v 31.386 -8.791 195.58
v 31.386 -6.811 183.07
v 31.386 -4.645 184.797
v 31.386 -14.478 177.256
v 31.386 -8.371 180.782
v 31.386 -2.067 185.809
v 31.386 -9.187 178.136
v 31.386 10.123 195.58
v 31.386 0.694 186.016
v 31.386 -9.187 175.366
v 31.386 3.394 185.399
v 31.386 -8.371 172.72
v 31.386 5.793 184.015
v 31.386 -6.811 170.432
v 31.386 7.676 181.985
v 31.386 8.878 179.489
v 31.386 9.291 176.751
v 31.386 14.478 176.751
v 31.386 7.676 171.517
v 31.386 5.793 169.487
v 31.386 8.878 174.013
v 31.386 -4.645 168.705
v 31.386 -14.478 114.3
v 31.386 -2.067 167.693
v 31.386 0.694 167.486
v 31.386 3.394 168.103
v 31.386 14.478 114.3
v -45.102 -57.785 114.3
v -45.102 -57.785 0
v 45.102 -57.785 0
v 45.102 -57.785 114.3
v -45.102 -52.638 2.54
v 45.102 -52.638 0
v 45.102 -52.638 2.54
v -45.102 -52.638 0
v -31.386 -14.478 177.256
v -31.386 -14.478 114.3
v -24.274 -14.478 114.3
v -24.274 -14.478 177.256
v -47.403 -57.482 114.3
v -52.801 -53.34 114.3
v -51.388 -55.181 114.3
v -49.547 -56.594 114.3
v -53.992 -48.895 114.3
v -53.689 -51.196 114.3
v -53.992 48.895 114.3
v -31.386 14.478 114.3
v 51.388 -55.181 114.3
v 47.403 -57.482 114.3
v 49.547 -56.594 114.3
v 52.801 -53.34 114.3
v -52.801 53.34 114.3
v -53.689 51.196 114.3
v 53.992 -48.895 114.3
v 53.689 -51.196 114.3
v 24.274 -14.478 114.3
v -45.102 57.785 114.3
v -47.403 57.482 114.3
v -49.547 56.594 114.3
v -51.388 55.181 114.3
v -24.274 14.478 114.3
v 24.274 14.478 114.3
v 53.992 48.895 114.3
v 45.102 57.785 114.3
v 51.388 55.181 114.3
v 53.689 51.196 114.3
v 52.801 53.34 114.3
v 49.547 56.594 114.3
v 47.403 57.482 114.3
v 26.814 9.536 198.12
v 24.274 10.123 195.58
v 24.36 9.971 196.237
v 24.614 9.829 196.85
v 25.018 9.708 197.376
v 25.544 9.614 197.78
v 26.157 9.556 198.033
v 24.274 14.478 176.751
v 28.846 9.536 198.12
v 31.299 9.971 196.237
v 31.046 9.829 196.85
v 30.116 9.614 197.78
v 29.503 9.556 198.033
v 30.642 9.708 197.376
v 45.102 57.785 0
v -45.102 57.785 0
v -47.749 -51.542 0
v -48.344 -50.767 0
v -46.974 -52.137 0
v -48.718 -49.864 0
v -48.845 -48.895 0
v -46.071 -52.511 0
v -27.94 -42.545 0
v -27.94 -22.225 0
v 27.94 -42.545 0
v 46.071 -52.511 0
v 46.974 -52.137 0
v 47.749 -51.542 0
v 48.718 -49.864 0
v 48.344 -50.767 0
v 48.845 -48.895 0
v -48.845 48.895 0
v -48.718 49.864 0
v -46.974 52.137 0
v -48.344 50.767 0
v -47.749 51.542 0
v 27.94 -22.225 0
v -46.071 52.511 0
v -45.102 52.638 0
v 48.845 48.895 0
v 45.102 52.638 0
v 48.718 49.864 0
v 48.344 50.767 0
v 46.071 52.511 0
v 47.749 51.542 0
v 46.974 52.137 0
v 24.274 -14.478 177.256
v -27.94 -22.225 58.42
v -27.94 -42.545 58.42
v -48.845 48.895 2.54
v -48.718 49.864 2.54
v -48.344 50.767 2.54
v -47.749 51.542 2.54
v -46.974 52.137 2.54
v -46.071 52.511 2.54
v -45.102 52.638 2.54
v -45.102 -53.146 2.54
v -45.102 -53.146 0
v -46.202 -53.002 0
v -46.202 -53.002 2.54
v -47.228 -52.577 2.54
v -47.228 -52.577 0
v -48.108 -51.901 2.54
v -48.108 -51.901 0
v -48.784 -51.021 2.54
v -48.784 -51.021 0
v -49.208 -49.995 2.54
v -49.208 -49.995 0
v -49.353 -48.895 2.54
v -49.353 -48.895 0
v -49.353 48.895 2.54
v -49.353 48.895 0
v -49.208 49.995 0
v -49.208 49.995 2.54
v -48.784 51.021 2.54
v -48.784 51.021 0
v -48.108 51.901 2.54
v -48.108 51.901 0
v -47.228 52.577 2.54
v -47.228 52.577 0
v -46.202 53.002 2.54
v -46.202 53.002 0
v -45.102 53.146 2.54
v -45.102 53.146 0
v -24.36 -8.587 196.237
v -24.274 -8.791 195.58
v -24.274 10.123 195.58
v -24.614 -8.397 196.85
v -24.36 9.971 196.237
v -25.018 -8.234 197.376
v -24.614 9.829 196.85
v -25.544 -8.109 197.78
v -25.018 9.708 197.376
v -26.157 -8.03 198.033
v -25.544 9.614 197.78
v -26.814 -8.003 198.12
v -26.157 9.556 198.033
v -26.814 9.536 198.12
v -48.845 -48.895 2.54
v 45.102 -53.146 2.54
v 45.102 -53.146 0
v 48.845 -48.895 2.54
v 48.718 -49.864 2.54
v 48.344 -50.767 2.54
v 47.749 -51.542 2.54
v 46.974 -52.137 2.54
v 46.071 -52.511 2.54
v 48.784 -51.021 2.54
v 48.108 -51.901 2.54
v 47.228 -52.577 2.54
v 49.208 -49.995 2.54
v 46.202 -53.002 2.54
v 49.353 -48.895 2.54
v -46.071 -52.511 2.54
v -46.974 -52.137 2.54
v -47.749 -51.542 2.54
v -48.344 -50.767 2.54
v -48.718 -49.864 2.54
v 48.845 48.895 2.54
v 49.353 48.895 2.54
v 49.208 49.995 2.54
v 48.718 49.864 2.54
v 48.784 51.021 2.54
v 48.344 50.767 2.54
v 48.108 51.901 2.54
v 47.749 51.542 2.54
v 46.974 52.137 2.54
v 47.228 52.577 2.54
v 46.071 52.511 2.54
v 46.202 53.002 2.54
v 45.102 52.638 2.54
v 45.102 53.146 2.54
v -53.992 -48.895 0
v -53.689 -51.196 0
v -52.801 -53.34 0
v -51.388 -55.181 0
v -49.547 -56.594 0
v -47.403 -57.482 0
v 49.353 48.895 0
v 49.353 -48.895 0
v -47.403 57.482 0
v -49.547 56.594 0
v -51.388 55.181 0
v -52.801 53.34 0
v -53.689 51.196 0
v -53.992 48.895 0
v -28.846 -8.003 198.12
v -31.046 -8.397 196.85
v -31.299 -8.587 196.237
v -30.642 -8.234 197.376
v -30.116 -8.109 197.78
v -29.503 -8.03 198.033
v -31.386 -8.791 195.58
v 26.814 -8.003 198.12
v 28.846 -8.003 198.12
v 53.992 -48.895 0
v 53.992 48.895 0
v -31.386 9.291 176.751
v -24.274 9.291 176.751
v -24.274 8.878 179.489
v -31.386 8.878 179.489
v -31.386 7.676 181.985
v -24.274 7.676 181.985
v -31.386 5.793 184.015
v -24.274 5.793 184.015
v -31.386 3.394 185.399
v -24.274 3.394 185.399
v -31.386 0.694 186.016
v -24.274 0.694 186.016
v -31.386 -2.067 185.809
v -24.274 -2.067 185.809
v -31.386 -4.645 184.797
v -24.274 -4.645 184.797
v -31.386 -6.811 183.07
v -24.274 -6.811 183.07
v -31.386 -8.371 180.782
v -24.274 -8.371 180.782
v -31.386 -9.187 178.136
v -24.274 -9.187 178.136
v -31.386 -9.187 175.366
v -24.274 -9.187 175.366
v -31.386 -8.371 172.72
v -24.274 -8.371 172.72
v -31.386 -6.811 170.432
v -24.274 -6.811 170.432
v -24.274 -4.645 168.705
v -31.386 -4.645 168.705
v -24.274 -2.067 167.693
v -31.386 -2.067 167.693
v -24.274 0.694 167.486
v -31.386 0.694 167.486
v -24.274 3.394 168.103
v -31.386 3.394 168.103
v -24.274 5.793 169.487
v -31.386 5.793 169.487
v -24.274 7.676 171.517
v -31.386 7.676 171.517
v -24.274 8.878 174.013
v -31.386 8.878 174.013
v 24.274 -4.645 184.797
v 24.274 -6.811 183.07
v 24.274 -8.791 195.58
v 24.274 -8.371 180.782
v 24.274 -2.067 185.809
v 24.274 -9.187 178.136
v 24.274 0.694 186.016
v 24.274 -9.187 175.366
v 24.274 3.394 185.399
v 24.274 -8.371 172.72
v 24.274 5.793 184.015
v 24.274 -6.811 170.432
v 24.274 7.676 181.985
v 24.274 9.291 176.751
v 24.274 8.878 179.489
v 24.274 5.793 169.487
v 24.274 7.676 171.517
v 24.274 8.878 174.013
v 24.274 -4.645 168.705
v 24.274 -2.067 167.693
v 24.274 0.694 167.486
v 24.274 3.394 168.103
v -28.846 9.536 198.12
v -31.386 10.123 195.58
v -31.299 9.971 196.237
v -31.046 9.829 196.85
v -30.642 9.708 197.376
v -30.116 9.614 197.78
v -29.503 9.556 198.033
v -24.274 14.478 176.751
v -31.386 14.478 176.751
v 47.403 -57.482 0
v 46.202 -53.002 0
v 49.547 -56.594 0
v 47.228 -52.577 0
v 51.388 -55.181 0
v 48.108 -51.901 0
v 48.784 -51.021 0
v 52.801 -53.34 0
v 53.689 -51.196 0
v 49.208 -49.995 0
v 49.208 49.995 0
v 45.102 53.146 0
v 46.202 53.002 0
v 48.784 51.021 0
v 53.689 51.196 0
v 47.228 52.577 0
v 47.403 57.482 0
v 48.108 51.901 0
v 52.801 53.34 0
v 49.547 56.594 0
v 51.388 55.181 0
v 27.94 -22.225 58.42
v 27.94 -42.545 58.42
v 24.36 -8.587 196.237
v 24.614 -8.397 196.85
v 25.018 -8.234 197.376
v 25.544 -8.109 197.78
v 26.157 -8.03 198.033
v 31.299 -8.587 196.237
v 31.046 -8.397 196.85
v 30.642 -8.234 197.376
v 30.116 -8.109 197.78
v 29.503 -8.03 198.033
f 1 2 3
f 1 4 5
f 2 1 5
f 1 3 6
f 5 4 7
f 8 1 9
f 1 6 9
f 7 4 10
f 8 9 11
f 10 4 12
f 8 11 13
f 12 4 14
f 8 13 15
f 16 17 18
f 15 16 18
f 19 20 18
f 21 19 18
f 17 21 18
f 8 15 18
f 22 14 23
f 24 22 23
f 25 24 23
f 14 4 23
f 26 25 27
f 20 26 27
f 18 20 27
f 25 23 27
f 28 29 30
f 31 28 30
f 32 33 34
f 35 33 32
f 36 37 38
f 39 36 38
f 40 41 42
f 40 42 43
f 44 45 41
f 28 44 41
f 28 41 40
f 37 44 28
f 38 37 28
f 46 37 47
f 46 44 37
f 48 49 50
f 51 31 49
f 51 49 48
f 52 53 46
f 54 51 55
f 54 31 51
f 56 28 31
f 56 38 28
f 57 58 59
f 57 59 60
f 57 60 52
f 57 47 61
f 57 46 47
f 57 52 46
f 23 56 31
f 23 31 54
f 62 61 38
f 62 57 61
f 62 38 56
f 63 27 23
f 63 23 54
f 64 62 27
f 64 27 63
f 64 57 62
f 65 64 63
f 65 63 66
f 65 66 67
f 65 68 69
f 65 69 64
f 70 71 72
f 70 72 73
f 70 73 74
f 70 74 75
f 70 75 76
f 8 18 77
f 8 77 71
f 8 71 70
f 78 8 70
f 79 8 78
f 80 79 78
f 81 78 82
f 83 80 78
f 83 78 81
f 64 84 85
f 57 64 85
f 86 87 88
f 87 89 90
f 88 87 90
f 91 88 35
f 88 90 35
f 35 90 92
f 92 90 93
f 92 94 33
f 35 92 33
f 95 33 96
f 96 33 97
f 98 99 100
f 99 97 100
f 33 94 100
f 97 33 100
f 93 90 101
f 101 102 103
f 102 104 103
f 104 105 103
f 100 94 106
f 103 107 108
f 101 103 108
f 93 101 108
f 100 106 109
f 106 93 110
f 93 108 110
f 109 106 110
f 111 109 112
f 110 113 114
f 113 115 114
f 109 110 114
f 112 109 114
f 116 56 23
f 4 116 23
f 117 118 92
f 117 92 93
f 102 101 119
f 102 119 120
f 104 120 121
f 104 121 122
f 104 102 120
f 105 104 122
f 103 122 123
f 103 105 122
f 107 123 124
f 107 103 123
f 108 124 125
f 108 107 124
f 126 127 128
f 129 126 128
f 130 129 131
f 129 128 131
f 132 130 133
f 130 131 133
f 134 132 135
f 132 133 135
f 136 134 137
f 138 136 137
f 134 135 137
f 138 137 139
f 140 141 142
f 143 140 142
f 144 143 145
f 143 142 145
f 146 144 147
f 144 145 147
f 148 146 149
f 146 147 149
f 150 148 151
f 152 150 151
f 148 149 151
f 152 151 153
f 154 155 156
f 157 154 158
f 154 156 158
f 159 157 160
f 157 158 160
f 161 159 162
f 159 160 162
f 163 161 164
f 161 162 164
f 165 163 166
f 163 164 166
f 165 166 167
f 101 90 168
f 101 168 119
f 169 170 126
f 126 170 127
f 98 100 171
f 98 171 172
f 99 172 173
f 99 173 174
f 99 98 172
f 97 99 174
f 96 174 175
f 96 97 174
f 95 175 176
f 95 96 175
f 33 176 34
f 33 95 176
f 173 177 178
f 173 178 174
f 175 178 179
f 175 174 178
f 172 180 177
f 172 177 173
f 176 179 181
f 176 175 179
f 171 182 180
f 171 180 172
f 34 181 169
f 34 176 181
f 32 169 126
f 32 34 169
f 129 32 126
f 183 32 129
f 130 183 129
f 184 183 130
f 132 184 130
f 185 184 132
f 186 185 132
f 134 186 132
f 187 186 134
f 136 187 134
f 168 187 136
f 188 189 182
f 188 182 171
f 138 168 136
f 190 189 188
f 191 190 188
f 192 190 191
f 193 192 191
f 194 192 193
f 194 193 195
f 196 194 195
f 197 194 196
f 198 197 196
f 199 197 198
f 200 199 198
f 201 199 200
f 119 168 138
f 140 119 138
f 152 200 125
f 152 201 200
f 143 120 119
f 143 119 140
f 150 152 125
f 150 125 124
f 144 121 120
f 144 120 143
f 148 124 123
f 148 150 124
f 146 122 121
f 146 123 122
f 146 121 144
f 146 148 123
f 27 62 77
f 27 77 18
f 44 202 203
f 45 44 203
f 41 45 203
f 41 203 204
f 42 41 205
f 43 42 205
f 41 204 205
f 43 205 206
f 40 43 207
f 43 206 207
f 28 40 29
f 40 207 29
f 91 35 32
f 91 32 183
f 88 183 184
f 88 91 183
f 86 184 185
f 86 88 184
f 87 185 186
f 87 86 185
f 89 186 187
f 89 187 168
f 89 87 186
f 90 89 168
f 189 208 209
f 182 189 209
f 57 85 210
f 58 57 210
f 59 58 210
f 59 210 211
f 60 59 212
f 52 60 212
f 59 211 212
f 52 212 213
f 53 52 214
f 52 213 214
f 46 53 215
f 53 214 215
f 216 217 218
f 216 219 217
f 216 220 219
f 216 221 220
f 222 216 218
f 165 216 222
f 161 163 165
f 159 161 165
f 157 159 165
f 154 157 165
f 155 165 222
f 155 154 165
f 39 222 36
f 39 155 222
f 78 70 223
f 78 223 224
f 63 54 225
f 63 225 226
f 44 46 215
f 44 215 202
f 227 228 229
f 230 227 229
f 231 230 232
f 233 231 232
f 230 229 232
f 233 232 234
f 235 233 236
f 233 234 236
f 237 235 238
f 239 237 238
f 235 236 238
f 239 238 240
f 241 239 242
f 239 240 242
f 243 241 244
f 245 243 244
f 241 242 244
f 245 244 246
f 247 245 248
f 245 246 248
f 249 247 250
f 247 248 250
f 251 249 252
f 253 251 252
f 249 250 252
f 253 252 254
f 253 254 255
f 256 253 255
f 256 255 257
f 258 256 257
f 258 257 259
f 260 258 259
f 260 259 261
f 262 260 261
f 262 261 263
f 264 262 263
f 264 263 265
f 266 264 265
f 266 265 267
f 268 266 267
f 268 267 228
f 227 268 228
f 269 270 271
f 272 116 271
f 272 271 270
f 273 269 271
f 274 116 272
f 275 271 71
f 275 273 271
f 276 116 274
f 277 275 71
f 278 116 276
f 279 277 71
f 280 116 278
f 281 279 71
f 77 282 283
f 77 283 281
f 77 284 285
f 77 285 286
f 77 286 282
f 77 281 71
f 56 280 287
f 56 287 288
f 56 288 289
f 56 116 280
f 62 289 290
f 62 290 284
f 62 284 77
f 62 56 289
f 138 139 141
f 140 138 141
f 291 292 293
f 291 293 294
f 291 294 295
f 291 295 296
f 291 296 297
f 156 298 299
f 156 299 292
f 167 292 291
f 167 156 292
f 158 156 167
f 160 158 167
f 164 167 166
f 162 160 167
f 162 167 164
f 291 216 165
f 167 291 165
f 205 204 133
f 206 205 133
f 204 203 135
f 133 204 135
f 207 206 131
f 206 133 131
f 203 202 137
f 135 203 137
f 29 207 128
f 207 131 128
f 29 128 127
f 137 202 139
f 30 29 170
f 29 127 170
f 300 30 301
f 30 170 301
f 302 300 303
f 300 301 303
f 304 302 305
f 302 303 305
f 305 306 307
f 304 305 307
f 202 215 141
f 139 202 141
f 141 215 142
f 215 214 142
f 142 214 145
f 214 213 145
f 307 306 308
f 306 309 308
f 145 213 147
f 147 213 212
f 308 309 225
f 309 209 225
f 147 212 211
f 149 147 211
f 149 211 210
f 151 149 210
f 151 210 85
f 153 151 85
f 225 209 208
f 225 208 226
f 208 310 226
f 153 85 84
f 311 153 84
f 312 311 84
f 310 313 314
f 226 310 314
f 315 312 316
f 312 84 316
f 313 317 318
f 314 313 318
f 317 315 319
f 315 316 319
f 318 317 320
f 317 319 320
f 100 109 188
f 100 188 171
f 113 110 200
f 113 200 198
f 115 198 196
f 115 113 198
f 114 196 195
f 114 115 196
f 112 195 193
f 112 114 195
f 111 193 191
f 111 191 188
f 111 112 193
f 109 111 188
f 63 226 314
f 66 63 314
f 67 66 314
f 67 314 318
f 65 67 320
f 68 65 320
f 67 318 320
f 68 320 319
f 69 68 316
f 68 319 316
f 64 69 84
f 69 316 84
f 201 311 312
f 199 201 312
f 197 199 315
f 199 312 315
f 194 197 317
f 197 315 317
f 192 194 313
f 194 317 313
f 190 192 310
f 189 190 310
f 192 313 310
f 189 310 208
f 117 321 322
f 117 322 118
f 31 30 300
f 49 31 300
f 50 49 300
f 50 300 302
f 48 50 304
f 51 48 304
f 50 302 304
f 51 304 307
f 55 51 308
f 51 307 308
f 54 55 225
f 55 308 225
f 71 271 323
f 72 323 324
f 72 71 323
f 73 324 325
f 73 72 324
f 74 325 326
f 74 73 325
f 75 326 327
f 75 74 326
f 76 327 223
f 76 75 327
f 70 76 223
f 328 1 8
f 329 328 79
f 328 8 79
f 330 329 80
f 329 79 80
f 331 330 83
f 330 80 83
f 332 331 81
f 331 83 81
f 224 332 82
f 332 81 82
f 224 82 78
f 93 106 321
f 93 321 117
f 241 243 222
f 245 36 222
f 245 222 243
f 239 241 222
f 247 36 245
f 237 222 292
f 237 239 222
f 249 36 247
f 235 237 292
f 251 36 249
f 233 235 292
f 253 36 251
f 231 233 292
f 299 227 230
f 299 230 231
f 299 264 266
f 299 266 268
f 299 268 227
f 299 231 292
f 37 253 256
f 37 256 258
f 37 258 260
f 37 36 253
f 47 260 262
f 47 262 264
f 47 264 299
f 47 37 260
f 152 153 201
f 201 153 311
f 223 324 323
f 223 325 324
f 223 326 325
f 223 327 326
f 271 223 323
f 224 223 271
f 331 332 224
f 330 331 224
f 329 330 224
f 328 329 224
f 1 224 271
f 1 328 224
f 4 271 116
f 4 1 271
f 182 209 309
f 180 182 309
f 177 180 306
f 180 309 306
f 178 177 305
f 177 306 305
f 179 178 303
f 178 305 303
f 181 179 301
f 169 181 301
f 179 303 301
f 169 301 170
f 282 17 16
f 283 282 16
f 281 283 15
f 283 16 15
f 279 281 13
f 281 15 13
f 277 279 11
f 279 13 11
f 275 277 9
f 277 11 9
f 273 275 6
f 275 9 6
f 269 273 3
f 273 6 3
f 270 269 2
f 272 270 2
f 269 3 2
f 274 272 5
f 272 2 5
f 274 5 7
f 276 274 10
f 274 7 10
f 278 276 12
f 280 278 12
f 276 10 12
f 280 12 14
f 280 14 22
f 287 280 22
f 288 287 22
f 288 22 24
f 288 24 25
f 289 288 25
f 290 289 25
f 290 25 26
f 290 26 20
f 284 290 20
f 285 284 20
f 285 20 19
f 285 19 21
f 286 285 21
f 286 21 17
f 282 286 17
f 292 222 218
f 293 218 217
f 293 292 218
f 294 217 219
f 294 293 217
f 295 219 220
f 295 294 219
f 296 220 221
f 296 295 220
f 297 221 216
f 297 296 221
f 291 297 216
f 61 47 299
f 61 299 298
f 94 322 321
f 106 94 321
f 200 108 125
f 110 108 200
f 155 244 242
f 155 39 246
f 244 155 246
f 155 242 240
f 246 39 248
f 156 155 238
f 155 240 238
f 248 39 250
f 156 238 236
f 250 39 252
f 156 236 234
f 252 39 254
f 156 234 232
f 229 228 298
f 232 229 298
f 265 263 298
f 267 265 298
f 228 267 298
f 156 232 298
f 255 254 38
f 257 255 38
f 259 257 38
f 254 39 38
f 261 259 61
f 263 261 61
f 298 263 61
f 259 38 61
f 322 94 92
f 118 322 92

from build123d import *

# Parameters (mm, degrees)
BOSS_EXTRUDE1_DEPTH     = 114.3
SKETCH2_W               = 55.88
SKETCH2_H               = 20.32
CUT_EXTRUDE1_DEPTH      = 58.42
SKETCH4_W               = 7.112
SKETCH4_H               = 28.956
BOSS_EXTRUDE2_DEPTH     = 83.82
CUT_EXTRUDE3_DEPTH      = 81.026
SKETCH8_R               = 9.290672209
CUT_EXTRUDE4_DEPTH      = 81.026
FILLET1_R               = 2.54
CUT_EXTRUDE_THIN1_DEPTH = 2.54


with BuildPart() as part:
    # Sketch1 → Boss-Extrude1 (new body)
    with BuildSketch(Plane.XY):
        with BuildLine():
            Line((45.101951145, 57.785), (-45.101951145, 57.785))
            ThreePointArc((-45.101951145, 57.785), (-51.38813043, 55.181179285), (-53.991951145, 48.895))
            Line((-53.991951145, 48.895), (-53.991951145, -48.895))
            ThreePointArc((-53.991951145, -48.895), (-51.38813043, -55.181179285), (-45.101951145, -57.785))
            Line((-45.101951145, -57.785), (45.101951145, -57.785))
            ThreePointArc((45.101951145, -57.785), (51.38813043, -55.181179285), (53.991951145, -48.895))
            Line((53.991951145, -48.895), (53.991951145, 48.895))
            ThreePointArc((53.991951145, 48.895), (51.38813043, 55.181179285), (45.101951145, 57.785))
        make_face()
    extrude(amount=BOSS_EXTRUDE1_DEPTH)

    # Sketch2 → Cut-Extrude1 (cut)
    with BuildSketch(Plane(origin=(0, 0, 0), x_dir=(-1, 0, 0), z_dir=(0, 0, -1))):
        with Locations((0, -32.385)):
            Rectangle(SKETCH2_W, SKETCH2_H)
    extrude(amount=-CUT_EXTRUDE1_DEPTH, mode=Mode.SUBTRACT)

    # Sketch4 → Boss-Extrude2 (add)
    with BuildSketch(Plane.XY.offset(114.3)):
        with Locations((-27.829951145, 0)):
            Rectangle(SKETCH4_W, SKETCH4_H)
        with Locations((27.829951145, 0)):
            Rectangle(SKETCH4_W, SKETCH4_H)
    extrude(amount=BOSS_EXTRUDE2_DEPTH)

    # Sketch7 → Cut-Extrude3 (cut)
    with BuildSketch(Plane(origin=(31.385951145, 0, 0), x_dir=(0, 0, -1), z_dir=(1, 0, 0))):
        Polygon((-214.942074504, -34.200153794), (-240.17713944, 1.162141148), (-200.137312033, 42.544769544), (-200.137312033, 40.508920027), (-166.132146275, 16.934056733), (-214.942074504, 5.644685578), (-204.648824334, -5.976725906), (-166.132146275, -17.930177717), align=None)
    extrude(amount=-CUT_EXTRUDE3_DEPTH, mode=Mode.SUBTRACT)

    # Sketch8 → Cut-Extrude4 (cut)
    with BuildSketch(Plane(origin=(31.385951145, 0, 0), x_dir=(0, 0, -1), z_dir=(1, 0, 0))):
        with Locations(Location((-176.750979796, 0, 0), (0, 0, 90))):
            Circle(SKETCH8_R)
    extrude(amount=-CUT_EXTRUDE4_DEPTH, mode=Mode.SUBTRACT)

    # Fillet1
    fillet1_edges = [part.edges().sort_by_distance(p)[0] for p in [
        (31.385951145, 0.766296382, 198.12),
        (24.273951145, 0.766296382, 198.12),
        (-31.385951145, 0.766296382, 198.12),
        (-24.273951145, 0.766296382, 198.12),
    ]]
    fillet(fillet1_edges, radius=FILLET1_R)

    # Sketch9 → Cut-Extrude-Thin1 (cut)
    with BuildSketch(Plane(origin=(0, 0, 0), x_dir=(-1, 0, 0), z_dir=(0, 0, -1))):
        with BuildLine():
            Line((-45.101951145, -53.146398513), (45.101951145, -53.146398513))
            ThreePointArc((45.101951145, -53.146398513), (48.108143863, -51.901192718), (49.353349658, -48.895))
            Line((49.353349658, -48.895), (49.353349658, 48.895))
            ThreePointArc((49.353349658, 48.895), (48.108143863, 51.901192718), (45.101951145, 53.146398513))
            Line((45.101951145, 53.146398513), (-45.101951145, 53.146398513))
            ThreePointArc((-45.101951145, 53.146398513), (-48.108143863, 51.901192718), (-49.353349658, 48.895))
            Line((-49.353349658, 48.895), (-49.353349658, -48.895))
            ThreePointArc((-49.353349658, -48.895), (-48.108143863, -51.901192718), (-45.101951145, -53.146398513))
        make_face()
        with BuildLine():
            Line((-45.101951145, -52.638398513), (45.101951145, -52.638398513))
            ThreePointArc((45.101951145, -52.638398513), (47.748933618, -51.541982473), (48.845349658, -48.895))
            Line((48.845349658, -48.895), (48.845349658, 48.895))
            ThreePointArc((48.845349658, 48.895), (47.748933618, 51.541982473), (45.101951145, 52.638398513))
            Line((45.101951145, 52.638398513), (-45.101951145, 52.638398513))
            ThreePointArc((-45.101951145, 52.638398513), (-47.748933618, 51.541982473), (-48.845349658, 48.895))
            Line((-48.845349658, 48.895), (-48.845349658, -48.895))
            ThreePointArc((-48.845349658, -48.895), (-47.748933618, -51.541982473), (-45.101951145, -52.638398513))
        make_face(mode=Mode.SUBTRACT)
    extrude(amount=-CUT_EXTRUDE_THIN1_DEPTH, mode=Mode.SUBTRACT)


solid = part.part
